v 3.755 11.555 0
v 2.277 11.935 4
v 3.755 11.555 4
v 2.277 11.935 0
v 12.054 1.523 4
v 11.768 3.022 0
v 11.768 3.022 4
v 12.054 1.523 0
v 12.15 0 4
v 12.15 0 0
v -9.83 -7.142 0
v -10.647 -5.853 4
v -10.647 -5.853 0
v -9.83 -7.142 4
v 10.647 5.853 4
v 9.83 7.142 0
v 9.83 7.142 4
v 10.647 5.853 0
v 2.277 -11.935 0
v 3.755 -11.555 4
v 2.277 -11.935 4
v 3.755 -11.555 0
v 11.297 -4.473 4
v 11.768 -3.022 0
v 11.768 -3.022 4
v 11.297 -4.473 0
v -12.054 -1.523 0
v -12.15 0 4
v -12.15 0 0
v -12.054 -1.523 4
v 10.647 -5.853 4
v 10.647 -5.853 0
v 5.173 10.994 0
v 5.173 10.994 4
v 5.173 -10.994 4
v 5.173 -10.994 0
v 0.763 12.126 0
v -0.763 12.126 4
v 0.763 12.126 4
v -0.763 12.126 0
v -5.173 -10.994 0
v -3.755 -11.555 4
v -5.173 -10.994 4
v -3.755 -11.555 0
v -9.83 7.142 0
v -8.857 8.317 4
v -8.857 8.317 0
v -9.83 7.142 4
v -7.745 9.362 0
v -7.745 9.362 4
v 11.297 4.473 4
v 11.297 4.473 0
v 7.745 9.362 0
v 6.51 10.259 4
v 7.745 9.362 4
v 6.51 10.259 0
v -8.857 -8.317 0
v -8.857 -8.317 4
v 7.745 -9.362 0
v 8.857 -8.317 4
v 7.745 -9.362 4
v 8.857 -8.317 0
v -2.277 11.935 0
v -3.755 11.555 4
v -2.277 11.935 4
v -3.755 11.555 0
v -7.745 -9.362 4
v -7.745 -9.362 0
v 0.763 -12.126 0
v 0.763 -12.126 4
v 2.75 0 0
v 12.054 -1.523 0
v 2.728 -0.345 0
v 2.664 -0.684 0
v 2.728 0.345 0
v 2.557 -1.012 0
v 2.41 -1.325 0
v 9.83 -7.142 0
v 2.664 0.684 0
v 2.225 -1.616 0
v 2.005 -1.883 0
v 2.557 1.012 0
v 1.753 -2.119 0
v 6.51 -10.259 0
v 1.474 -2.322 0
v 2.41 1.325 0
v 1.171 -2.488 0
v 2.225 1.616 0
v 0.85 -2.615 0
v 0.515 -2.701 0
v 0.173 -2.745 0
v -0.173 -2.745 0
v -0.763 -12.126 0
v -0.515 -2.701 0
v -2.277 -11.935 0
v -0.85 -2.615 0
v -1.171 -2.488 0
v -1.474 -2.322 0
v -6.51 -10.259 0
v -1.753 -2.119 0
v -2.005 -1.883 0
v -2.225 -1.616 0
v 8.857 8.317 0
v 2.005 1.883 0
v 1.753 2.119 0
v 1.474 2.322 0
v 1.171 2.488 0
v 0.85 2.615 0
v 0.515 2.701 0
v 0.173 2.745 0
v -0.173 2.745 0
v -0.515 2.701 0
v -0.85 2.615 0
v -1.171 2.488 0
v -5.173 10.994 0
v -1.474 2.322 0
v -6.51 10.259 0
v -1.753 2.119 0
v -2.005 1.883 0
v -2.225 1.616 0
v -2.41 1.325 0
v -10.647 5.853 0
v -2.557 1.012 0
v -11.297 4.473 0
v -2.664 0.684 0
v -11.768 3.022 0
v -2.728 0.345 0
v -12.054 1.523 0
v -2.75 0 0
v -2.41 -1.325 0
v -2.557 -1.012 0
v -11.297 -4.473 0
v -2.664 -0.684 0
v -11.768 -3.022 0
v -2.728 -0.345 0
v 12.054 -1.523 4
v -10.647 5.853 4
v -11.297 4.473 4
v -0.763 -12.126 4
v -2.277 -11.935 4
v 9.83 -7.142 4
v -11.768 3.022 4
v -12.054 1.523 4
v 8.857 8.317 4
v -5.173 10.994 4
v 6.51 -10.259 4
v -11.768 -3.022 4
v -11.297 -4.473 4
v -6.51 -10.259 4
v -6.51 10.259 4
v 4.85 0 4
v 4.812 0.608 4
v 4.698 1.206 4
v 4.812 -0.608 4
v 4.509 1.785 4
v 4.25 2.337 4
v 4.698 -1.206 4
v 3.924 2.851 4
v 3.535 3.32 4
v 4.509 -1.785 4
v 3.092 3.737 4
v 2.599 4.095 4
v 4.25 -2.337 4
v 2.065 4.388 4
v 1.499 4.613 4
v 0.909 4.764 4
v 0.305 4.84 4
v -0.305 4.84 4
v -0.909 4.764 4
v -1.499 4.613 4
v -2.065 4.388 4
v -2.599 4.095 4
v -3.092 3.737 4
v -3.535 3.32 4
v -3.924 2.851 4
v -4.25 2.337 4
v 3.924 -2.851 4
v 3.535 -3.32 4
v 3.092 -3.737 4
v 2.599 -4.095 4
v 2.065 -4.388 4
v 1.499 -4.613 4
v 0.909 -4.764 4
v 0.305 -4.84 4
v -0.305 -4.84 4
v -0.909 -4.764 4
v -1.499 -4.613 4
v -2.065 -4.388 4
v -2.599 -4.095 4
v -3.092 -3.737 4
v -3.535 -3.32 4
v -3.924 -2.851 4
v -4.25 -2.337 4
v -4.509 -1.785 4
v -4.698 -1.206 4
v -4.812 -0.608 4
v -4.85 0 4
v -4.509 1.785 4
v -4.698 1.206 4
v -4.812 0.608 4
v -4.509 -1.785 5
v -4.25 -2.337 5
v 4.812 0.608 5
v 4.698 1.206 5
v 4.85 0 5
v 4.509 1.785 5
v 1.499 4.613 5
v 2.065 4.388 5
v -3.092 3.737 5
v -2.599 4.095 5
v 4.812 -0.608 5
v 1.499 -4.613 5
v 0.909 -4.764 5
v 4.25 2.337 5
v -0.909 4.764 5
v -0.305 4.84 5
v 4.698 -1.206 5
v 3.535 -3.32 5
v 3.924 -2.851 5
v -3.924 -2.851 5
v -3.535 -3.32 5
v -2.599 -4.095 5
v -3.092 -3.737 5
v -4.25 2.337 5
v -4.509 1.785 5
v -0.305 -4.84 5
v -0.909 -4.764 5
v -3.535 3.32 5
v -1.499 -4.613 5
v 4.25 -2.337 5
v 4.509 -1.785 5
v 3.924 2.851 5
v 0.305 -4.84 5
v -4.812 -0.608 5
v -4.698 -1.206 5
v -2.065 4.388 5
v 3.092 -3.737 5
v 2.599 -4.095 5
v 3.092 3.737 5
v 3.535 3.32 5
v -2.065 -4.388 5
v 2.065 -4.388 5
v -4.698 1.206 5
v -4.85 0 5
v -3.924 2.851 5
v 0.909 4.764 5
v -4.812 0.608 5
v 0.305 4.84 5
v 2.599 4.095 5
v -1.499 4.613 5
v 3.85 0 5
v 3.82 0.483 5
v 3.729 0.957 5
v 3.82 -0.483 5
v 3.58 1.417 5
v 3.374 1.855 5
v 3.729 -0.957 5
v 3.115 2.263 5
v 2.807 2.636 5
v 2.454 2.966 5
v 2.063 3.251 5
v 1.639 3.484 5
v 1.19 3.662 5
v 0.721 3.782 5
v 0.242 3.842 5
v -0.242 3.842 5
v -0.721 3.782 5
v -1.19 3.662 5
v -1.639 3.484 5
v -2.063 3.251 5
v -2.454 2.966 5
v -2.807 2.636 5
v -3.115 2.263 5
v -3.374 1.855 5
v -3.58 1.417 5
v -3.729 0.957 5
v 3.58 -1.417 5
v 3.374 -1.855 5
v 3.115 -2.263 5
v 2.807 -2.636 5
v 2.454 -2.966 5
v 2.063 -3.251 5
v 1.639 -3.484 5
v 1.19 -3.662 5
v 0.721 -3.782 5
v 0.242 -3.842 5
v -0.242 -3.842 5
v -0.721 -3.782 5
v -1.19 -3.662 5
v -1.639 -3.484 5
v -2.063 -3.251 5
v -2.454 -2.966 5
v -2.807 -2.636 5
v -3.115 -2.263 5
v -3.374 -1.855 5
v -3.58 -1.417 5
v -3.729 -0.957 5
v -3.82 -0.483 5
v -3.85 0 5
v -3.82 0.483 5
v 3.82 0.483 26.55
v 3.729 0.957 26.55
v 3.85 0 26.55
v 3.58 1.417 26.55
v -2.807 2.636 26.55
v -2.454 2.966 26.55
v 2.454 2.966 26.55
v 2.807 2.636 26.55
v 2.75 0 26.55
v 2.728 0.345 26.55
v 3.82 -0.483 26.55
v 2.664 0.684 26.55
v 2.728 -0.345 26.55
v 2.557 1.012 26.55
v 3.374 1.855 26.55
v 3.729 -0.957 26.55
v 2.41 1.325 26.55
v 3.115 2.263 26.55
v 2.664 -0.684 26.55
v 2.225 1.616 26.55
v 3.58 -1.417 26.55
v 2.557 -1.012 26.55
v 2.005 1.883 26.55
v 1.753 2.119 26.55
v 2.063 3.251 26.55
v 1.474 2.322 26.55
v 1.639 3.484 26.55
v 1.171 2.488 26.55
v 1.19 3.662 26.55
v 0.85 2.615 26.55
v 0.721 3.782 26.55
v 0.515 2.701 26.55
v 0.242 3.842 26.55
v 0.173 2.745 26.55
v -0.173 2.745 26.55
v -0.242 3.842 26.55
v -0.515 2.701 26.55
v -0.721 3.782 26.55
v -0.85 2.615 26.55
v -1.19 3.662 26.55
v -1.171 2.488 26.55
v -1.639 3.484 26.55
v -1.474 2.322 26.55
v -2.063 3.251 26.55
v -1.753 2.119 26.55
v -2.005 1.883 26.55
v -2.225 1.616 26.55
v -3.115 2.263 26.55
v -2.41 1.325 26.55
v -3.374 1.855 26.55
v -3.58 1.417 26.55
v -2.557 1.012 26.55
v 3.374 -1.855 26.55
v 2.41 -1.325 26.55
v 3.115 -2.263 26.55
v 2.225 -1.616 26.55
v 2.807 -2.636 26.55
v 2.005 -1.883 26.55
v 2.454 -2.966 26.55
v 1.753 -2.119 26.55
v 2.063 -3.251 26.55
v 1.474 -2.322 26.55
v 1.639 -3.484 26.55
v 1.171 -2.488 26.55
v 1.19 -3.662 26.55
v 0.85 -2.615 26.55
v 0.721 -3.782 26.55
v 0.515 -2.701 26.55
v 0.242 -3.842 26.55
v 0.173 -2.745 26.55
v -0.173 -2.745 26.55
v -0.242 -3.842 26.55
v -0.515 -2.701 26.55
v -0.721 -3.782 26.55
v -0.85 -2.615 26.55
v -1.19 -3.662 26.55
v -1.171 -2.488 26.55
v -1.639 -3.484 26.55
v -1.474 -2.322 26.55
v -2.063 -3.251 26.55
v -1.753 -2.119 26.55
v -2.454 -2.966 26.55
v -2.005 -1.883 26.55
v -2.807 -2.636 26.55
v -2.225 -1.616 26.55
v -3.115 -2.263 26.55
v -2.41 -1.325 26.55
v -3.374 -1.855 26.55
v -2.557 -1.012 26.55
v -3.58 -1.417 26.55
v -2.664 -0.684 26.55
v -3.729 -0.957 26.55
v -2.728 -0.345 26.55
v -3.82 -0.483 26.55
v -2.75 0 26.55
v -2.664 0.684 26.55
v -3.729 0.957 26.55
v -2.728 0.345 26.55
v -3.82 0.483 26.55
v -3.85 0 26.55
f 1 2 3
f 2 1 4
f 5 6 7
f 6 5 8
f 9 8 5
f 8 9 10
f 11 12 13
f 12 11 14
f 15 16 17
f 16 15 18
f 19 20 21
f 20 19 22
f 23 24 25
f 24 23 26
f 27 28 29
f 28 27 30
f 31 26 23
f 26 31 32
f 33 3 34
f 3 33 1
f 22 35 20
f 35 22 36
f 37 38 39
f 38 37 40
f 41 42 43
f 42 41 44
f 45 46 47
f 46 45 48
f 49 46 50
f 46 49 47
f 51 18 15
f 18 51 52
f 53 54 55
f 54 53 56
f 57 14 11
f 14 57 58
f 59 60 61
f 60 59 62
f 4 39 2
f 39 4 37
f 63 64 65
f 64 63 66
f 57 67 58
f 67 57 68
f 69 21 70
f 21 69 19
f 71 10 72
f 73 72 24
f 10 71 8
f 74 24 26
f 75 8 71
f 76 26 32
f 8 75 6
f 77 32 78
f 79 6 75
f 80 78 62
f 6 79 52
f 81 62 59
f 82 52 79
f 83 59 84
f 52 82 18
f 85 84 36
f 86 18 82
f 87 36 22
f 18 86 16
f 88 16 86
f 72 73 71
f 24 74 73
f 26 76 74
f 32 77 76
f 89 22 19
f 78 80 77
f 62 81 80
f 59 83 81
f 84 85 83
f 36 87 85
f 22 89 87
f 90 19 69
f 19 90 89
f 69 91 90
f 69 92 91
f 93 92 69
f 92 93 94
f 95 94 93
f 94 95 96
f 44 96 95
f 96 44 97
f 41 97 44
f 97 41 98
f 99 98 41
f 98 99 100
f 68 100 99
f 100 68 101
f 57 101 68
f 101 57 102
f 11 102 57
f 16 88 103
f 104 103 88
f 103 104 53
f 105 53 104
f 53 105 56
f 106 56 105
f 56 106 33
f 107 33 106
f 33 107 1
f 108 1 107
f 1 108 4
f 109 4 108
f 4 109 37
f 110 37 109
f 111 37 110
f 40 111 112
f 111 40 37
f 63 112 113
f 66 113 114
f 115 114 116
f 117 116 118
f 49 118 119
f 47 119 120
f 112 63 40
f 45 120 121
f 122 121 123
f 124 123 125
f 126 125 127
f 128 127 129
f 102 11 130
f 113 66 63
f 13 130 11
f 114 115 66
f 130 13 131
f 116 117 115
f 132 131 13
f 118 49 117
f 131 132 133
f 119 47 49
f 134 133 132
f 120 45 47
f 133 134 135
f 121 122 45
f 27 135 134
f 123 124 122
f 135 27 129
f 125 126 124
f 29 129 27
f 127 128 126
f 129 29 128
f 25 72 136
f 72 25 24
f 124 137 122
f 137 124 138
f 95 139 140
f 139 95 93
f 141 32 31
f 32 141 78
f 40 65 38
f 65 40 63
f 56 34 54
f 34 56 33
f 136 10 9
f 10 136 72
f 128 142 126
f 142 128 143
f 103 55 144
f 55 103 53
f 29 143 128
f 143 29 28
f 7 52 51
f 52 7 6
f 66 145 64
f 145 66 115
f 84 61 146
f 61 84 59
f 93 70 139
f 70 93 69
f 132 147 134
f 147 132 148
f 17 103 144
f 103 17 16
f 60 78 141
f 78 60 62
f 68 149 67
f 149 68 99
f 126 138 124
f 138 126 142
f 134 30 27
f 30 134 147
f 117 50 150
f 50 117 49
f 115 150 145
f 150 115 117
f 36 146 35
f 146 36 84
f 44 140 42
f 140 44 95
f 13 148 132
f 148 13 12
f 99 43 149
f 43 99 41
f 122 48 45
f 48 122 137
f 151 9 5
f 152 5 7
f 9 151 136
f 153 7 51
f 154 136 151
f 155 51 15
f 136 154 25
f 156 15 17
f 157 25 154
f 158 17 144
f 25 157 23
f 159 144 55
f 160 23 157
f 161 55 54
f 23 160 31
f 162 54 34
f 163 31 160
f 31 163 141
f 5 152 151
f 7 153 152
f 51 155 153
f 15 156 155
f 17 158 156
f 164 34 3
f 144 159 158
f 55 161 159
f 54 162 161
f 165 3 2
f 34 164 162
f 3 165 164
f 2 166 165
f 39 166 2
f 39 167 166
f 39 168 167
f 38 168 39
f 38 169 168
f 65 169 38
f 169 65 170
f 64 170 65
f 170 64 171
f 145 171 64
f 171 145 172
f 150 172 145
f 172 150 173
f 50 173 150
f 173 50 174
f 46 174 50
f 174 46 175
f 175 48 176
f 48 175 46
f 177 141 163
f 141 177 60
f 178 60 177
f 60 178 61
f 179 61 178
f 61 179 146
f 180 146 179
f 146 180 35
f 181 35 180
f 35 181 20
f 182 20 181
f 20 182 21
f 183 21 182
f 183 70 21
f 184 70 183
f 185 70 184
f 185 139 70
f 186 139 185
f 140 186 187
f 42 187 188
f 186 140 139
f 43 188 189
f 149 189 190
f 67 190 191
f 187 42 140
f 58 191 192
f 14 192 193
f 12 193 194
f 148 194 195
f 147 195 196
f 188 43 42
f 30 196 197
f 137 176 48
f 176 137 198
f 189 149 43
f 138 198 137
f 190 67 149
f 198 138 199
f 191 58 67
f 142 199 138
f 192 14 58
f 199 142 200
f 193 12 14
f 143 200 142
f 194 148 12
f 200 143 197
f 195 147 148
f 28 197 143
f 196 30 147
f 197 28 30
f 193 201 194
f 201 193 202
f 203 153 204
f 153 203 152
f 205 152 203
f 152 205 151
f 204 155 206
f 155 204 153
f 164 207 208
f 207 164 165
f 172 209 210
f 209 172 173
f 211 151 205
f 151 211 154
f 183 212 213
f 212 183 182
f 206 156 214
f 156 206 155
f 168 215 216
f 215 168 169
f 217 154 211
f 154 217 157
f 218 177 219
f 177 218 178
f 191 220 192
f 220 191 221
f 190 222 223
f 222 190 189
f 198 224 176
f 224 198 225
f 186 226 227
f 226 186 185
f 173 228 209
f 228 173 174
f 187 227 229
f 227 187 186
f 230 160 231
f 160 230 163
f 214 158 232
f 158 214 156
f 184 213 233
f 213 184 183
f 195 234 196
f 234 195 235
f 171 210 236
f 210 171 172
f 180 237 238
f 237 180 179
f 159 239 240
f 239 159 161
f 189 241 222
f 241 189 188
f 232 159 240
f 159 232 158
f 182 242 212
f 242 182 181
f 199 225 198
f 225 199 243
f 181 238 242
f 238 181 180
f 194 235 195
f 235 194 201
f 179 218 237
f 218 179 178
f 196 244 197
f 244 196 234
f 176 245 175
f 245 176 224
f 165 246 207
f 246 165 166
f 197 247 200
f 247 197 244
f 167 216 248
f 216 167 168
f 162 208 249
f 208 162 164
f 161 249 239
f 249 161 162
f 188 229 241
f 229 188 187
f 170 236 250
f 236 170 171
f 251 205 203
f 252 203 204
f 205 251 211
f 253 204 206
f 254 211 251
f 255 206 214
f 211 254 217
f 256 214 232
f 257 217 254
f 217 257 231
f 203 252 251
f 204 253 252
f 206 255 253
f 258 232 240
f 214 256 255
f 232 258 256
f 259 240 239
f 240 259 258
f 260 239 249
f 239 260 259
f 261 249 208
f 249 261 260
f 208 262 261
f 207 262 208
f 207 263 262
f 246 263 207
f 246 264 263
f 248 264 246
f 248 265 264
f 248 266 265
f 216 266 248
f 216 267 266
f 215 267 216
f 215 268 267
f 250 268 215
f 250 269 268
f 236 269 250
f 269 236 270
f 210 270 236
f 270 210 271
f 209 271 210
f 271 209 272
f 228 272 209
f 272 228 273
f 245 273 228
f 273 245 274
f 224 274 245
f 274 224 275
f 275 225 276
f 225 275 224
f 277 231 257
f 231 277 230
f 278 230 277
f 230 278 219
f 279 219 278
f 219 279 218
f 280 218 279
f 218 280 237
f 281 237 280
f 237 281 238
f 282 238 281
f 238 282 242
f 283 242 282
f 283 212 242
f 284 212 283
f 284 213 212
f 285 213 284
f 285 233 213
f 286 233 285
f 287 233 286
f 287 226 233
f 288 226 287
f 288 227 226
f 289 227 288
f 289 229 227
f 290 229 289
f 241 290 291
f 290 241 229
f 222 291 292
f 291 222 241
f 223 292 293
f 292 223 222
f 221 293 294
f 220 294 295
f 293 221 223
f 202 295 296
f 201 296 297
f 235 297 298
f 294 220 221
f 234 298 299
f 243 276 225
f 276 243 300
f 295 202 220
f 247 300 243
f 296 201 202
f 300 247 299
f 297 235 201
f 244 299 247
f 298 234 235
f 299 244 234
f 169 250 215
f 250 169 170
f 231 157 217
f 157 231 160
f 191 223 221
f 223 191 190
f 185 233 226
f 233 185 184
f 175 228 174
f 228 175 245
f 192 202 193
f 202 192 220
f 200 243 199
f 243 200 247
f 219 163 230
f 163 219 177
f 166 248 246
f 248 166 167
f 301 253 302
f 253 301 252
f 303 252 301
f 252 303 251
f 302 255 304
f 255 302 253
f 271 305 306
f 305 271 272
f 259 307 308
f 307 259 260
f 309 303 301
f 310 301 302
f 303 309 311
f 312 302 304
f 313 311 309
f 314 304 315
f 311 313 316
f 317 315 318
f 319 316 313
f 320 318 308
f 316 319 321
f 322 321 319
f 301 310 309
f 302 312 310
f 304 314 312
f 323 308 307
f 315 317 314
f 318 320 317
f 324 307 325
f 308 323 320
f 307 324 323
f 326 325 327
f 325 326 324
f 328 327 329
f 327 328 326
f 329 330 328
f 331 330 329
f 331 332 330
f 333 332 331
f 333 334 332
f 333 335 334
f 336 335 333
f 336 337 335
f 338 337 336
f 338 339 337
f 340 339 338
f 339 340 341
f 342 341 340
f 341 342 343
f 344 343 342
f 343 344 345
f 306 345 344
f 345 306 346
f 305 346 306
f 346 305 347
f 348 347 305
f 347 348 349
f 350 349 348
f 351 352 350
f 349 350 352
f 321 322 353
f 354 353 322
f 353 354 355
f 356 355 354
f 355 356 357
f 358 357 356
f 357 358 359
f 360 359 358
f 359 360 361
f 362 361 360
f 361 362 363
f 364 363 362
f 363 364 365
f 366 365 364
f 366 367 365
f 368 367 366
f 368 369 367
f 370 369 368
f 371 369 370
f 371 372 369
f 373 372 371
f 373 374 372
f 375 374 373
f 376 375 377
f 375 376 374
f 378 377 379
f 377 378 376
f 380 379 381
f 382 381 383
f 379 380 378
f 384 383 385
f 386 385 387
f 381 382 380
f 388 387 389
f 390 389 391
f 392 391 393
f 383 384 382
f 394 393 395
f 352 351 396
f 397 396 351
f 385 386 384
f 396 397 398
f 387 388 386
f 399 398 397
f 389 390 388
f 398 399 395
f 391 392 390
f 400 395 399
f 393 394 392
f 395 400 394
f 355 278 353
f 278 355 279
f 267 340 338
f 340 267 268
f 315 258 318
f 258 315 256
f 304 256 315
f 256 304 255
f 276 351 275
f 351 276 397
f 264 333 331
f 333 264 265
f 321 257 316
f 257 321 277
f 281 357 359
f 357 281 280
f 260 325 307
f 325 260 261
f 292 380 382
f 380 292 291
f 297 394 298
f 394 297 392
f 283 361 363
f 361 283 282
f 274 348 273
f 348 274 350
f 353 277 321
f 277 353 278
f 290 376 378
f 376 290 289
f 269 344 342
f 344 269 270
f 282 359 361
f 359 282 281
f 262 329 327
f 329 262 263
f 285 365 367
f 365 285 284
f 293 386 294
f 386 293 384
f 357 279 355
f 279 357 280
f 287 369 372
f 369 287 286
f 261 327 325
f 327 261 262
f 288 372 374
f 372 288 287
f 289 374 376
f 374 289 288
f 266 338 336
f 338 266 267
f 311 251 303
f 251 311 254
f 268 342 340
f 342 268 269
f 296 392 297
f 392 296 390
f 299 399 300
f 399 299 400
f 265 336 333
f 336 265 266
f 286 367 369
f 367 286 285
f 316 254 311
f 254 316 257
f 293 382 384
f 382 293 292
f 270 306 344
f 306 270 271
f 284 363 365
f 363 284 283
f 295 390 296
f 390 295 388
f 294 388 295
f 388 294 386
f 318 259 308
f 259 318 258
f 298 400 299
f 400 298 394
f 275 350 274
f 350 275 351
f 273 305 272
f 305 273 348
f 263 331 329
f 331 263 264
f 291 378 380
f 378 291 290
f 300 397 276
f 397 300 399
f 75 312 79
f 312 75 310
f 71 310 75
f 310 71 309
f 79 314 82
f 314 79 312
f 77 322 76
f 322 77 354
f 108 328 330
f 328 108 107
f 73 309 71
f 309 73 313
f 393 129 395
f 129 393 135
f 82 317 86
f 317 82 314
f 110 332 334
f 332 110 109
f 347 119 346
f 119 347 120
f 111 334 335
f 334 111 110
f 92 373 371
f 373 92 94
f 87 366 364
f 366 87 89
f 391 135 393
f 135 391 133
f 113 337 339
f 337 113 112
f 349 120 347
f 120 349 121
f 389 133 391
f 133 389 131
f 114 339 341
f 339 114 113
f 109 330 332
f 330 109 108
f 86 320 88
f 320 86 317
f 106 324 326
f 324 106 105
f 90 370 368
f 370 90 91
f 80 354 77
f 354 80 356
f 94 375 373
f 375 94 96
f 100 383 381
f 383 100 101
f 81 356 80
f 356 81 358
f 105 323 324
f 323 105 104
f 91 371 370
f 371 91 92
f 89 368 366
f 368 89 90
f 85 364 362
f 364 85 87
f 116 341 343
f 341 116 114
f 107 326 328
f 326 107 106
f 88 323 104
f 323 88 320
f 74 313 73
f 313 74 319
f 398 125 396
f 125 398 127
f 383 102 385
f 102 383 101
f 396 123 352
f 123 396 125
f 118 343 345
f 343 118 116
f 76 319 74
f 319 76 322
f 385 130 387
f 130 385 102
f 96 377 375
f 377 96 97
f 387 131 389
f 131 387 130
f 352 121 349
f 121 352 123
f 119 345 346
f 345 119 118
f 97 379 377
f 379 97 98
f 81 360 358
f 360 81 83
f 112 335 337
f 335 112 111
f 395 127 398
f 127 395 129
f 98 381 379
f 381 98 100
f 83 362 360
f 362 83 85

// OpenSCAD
//valec k disku do mechoveho kola

include <../parameters.scad>

cylinder_1_thickness = 4;
cylinder_1_diameter = 608_bearing_outer_diameter+2;
cylinder_2_thickness = 5;
cylinder_2_diameter = 608_bearing_inner_diameter+2;

module 888_1030 () {
    difference() {
        union() {
            cylinder(h=cylinder_1_thickness, d=cylinder_1_diameter, $fn=50 );
            cylinder(h=cylinder_2_thickness, d=cylinder_2_diameter, $fn=50 );
            cylinder(h=wheel_inner_thickness/2+wheel_disc_upper_thickness+608_bearing_thickness/2+cylinder_1_thickness,
                  d=608_bearing_inner_diameter, $fn=50);
        }
        translate([0,0,-1])
            cylinder(h=wheel_inner_thickness, d=M5_screw_diameter, $fn=50);
    }
}

888_1030();
